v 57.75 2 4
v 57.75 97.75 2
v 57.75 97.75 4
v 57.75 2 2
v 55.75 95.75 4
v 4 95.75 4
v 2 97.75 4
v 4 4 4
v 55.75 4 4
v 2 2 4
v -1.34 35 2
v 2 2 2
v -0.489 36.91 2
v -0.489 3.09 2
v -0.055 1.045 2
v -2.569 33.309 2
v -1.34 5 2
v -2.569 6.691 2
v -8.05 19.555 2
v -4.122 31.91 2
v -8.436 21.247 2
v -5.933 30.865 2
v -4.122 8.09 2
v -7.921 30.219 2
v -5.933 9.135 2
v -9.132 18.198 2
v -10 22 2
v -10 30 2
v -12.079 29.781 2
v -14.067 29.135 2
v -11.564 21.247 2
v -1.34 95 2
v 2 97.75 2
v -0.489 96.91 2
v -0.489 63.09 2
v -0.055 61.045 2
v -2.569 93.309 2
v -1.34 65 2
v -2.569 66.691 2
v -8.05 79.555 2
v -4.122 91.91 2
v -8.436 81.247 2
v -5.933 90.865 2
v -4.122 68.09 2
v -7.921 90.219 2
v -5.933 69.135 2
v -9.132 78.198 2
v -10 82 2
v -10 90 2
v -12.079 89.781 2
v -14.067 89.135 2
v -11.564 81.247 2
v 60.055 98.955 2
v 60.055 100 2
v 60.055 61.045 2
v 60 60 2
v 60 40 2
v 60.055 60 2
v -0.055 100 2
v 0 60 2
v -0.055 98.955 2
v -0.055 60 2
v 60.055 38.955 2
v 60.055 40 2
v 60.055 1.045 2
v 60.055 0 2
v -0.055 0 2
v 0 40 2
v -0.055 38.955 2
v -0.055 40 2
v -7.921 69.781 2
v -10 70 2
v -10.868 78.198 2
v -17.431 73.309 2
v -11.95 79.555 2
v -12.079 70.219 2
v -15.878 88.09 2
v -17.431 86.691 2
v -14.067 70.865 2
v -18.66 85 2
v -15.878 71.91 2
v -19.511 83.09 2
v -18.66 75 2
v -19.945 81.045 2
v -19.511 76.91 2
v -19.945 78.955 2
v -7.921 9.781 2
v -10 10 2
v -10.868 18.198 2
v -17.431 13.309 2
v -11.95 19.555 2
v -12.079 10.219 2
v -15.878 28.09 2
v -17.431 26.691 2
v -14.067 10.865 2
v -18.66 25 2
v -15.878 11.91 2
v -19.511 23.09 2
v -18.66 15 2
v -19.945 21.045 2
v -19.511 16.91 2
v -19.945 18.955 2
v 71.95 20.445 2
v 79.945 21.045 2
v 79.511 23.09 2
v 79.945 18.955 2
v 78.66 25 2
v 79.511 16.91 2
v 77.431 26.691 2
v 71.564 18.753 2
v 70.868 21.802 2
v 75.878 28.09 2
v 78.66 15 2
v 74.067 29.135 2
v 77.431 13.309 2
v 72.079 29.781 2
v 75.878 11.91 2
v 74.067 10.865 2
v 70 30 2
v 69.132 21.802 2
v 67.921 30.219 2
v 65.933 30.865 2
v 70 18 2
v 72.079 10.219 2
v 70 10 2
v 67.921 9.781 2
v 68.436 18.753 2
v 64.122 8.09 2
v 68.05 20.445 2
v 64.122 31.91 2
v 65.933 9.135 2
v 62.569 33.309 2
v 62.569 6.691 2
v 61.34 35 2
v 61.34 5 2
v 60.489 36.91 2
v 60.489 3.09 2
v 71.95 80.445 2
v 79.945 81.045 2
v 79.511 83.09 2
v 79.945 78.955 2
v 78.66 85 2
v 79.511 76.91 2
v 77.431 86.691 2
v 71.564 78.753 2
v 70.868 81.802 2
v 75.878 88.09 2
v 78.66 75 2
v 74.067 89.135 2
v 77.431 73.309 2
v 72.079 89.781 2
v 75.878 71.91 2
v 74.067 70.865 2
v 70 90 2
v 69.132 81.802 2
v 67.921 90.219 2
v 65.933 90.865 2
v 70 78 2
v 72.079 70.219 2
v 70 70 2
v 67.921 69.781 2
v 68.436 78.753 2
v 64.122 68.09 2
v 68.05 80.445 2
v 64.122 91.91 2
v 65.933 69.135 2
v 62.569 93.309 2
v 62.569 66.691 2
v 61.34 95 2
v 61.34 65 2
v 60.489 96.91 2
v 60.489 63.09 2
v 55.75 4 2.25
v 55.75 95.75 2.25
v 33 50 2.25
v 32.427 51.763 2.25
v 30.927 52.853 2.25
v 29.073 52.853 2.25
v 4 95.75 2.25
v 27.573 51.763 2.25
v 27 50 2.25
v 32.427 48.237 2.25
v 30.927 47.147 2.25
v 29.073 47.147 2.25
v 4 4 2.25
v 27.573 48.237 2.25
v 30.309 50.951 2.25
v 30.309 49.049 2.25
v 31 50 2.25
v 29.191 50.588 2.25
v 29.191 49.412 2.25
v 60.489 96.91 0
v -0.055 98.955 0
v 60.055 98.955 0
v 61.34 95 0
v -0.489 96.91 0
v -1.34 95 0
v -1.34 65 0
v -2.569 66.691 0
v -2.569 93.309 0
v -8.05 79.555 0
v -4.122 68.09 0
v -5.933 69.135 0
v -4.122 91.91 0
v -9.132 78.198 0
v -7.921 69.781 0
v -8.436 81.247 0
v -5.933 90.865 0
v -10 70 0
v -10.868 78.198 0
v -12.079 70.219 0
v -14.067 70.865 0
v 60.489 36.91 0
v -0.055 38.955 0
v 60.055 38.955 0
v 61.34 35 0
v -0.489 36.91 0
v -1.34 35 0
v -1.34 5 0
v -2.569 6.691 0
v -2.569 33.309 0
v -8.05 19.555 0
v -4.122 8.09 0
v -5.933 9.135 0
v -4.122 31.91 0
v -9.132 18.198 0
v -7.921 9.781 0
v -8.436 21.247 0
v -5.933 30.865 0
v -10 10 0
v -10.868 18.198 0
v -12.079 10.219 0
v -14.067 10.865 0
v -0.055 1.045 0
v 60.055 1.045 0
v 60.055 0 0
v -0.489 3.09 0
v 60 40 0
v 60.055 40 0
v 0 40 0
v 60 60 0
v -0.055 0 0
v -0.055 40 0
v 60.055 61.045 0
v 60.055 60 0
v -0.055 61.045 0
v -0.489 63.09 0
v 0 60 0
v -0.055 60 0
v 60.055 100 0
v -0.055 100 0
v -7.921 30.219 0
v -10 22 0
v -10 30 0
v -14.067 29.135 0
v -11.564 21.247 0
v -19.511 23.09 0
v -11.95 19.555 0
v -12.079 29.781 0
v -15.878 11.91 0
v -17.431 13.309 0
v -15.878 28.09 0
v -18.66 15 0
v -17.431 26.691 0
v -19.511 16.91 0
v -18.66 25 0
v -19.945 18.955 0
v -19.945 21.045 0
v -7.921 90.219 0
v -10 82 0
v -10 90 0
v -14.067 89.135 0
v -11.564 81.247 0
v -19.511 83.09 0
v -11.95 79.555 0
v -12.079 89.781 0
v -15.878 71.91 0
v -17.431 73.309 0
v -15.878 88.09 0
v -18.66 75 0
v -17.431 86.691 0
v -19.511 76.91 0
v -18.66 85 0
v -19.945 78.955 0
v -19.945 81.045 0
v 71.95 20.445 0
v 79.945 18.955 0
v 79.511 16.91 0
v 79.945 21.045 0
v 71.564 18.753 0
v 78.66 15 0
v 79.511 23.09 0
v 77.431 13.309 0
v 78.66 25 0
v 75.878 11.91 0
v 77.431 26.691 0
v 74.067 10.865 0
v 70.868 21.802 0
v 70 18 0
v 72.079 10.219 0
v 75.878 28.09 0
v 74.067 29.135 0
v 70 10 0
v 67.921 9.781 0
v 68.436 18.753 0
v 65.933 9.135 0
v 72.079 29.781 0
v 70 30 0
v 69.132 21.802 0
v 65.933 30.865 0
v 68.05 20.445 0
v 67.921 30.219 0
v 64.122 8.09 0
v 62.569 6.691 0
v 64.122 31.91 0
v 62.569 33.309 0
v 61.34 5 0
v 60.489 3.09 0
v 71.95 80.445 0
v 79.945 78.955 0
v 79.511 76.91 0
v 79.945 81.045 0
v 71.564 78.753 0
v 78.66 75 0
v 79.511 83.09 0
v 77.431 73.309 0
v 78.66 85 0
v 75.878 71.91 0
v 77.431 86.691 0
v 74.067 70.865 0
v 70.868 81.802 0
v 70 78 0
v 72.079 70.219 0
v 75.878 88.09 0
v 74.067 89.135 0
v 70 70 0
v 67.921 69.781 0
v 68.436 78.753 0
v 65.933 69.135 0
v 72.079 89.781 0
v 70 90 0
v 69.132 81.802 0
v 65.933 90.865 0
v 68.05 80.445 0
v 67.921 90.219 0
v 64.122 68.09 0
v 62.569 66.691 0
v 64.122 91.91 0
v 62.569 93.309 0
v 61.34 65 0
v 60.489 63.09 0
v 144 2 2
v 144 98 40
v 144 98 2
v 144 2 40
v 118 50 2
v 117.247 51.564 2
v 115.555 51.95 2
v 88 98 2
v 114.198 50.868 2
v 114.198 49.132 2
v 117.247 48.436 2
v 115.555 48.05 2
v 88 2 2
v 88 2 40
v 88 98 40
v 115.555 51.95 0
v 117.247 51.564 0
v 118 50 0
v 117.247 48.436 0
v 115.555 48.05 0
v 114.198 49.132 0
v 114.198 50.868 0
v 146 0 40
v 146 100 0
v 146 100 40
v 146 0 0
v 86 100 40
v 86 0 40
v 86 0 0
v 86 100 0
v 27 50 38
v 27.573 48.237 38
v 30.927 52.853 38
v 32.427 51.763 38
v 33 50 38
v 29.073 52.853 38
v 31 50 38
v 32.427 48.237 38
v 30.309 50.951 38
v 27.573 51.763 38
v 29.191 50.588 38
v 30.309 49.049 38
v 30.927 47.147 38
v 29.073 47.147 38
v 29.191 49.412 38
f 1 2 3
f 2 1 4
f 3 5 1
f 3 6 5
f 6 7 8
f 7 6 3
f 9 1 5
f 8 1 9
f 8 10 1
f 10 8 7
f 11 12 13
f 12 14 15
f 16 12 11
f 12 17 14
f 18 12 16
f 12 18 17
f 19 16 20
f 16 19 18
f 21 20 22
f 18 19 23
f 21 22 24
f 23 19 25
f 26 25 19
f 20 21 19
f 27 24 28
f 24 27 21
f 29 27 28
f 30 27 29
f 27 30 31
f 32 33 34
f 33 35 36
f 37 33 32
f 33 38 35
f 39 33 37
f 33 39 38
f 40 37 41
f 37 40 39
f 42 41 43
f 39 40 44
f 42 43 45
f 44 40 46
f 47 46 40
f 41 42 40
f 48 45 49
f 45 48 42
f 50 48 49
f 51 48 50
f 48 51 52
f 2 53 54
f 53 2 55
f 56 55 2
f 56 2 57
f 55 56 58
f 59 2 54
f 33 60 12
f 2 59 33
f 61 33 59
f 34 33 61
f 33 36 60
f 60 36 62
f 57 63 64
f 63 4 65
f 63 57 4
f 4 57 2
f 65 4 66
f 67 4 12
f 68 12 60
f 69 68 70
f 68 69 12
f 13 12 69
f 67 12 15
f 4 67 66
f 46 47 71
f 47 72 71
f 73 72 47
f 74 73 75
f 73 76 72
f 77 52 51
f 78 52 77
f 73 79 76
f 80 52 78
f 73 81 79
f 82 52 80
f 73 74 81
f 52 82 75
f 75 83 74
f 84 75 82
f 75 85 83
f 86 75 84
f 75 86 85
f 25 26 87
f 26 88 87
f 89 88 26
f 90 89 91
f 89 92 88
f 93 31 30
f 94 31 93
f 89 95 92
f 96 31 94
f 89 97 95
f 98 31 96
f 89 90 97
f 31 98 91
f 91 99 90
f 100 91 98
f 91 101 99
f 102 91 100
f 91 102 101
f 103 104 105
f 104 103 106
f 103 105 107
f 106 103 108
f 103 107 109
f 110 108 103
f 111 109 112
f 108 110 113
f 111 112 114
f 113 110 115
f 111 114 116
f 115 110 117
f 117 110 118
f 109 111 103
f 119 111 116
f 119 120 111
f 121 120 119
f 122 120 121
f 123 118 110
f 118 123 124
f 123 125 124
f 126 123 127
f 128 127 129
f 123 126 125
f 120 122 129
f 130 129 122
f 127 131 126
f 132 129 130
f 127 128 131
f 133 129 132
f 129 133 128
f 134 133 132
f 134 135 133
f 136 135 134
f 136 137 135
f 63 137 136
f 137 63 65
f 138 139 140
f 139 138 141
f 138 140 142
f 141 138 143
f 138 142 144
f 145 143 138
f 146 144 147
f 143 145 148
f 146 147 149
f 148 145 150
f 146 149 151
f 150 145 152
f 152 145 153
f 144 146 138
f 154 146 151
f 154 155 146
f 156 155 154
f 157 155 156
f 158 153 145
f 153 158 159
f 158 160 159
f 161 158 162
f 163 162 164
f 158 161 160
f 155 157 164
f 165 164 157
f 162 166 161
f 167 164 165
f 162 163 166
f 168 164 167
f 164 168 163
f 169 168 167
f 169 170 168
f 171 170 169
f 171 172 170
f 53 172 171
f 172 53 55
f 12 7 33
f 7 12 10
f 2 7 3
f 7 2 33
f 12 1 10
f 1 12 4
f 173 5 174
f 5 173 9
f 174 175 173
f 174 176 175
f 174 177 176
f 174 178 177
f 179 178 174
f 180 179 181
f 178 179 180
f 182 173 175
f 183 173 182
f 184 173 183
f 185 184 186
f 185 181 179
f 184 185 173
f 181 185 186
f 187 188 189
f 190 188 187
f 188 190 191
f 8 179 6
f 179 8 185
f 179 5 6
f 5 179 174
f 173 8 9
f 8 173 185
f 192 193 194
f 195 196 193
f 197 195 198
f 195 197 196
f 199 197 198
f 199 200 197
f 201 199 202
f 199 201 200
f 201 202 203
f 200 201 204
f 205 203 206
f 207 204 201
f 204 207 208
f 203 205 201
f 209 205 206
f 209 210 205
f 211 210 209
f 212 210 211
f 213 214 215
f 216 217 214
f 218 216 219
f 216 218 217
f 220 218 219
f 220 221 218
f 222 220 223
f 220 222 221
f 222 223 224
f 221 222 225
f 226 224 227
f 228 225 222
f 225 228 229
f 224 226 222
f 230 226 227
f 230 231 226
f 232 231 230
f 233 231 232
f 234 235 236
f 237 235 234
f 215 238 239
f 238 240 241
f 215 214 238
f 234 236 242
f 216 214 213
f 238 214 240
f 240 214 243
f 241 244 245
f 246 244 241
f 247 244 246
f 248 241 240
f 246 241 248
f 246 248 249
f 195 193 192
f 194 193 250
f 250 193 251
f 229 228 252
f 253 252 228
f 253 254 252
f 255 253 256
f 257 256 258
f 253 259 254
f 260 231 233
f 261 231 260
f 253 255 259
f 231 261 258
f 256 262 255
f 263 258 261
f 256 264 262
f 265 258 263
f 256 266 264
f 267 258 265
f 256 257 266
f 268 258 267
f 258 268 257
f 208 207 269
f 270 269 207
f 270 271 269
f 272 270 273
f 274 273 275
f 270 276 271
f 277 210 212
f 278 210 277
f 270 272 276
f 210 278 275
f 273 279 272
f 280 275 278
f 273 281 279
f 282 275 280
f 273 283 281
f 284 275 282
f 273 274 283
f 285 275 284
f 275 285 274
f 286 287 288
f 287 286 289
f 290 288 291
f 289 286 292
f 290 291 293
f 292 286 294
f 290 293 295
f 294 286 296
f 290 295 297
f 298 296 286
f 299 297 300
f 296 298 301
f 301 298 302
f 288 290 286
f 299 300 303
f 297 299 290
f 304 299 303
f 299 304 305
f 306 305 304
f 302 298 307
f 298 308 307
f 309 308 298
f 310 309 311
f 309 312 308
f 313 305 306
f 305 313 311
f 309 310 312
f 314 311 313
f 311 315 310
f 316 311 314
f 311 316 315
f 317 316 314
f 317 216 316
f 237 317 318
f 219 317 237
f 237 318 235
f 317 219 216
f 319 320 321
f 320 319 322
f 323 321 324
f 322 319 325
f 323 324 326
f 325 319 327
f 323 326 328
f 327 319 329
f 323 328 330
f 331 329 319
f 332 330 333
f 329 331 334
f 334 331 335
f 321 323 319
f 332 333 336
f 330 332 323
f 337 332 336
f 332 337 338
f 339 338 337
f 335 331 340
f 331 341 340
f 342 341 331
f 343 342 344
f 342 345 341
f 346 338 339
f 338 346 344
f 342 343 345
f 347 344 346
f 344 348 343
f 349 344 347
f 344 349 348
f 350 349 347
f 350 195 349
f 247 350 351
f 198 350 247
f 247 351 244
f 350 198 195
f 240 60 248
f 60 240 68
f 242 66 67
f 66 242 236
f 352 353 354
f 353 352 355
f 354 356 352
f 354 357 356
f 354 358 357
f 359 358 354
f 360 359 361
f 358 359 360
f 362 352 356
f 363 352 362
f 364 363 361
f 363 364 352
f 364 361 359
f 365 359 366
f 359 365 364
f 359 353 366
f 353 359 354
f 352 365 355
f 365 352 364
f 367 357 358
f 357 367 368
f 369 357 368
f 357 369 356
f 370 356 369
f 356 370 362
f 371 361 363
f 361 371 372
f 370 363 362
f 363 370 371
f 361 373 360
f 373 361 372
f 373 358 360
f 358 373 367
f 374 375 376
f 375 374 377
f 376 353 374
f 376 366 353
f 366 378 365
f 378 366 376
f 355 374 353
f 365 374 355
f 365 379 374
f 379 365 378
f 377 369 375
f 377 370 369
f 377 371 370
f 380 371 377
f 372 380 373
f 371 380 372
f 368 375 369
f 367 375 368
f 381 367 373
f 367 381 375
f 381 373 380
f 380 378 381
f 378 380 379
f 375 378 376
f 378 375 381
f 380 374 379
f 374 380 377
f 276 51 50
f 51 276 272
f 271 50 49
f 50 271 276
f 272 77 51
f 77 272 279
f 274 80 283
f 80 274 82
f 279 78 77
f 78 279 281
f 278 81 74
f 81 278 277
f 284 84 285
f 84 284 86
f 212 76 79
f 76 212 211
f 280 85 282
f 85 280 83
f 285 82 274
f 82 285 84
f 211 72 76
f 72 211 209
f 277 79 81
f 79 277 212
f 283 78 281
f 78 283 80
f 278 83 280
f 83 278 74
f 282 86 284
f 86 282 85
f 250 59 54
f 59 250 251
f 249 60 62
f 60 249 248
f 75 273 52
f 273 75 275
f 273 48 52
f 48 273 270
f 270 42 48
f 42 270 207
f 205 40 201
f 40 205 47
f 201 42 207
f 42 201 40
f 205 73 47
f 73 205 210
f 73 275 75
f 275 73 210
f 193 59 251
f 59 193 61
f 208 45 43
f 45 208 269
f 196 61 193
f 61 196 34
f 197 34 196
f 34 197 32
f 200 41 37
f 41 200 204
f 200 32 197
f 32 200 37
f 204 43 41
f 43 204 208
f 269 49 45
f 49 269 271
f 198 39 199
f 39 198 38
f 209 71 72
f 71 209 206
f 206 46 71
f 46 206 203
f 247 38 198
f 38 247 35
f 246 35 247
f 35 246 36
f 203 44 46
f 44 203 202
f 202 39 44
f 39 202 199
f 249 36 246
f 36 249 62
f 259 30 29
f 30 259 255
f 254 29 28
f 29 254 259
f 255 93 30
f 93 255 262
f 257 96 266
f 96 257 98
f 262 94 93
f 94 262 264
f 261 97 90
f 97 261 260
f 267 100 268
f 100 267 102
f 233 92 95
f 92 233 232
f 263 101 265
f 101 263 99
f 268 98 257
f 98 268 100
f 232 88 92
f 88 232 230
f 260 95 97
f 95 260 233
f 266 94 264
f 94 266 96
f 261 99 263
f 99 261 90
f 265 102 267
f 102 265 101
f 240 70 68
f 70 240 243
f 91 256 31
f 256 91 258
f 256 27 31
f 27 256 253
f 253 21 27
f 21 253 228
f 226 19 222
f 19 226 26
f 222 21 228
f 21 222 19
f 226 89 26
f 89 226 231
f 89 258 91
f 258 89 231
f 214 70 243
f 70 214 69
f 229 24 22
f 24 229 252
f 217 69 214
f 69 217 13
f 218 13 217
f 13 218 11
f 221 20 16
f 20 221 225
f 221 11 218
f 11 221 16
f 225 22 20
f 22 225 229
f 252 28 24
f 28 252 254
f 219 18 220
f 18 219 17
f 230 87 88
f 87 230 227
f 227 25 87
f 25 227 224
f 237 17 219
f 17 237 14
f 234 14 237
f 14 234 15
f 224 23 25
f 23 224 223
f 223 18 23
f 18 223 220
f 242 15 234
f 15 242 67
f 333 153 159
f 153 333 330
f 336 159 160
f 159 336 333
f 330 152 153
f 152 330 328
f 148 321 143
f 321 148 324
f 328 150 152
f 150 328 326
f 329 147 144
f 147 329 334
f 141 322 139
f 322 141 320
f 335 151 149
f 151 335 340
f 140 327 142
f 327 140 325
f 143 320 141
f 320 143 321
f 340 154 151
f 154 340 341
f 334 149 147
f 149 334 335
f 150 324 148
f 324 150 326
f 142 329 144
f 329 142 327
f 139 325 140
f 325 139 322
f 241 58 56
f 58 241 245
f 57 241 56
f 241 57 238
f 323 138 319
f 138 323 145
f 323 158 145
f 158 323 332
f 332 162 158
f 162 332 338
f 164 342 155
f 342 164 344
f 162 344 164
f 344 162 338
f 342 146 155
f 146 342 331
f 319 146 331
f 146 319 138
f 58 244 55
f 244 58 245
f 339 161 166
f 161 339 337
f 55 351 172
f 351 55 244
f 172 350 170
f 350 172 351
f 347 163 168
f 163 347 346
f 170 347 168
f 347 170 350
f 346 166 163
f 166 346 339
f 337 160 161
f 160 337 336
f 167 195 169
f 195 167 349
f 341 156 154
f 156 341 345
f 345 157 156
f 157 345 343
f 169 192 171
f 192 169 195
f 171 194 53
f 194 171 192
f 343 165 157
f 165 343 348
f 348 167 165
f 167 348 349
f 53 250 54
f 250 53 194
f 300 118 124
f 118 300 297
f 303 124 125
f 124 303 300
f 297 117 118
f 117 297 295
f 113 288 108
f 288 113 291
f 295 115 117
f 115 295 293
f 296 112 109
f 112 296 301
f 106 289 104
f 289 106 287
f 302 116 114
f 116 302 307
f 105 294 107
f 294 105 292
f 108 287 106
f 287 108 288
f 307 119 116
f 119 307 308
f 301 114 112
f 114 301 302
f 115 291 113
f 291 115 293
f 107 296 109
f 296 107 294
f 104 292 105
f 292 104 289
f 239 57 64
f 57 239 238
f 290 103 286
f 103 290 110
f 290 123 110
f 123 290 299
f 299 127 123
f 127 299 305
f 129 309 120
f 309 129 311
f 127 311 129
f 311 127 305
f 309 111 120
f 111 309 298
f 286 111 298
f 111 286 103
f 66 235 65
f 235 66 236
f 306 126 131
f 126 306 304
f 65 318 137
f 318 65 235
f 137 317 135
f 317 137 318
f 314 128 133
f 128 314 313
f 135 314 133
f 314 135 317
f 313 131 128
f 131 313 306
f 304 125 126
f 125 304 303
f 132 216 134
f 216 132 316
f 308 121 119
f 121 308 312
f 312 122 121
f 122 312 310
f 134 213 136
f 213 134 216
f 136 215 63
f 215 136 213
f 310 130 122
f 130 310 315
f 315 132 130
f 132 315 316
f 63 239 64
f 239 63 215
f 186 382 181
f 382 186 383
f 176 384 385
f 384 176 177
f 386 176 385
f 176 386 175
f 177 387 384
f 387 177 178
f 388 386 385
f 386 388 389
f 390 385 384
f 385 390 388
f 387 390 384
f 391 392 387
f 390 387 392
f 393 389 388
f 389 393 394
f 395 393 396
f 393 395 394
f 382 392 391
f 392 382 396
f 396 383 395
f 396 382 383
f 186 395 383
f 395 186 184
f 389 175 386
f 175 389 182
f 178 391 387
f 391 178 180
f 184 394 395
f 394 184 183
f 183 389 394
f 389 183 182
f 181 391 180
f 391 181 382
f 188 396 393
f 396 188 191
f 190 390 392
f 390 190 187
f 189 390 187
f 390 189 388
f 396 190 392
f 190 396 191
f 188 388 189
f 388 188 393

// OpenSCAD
FUDGE = 0.25;  // extra space for parts to fit
WALL_THK = 2; // how thick the walls are
BOX_OUTER = [60,100,40];  // how big the box is
FLANGE_R = 10;
FLANGE_SCREW_R = 2;

function box_inner() = [BOX_OUTER[0]-WALL_THK*2, BOX_OUTER[1]-WALL_THK*2, BOX_OUTER[2] ]; 

module box_lid() {
// box lid goes over project stuff
  difference() {
    cube(BOX_OUTER);
    union () {
      translate([WALL_THK,WALL_THK, WALL_THK]) cube(   box_inner());
      translate([BOX_OUTER[0]/2, BOX_OUTER[1]/2, -  WALL_THK/2]) cylinder( WALL_THK*2, FLANGE_SCREW_R, FLANGE_SCREW_R);
    }
  } 
}



module box_bottom (BOX_OUTER) {
  // project goes on flat board bottom of box thingy
  box_bottom = [BOX_OUTER[0],BOX_OUTER[1], WALL_THK];
  box_inner = box_inner();
  //union () {
    cube(box_bottom); 
    // make lip
    difference() {
      translate([ WALL_THK, WALL_THK, WALL_THK]) cube([box_inner[0]-FUDGE, box_inner[1]-FUDGE, WALL_THK ]);
      translate([ WALL_THK*2, WALL_THK*2, WALL_THK+  FUDGE]) cube([ box_inner[0]-(2*WALL_THK+FUDGE),box_inner[1]-(2*WALL_THK+FUDGE), WALL_THK ]);
    }
  //}
  
}

box_bottom = [BOX_OUTER[0],BOX_OUTER[1], WALL_THK];
cube(box_bottom);

module screw_flange ( ) {
   translate([0,FLANGE_R,0]) difference() {
       union () {
           cylinder( WALL_THK, FLANGE_R, FLANGE_R );
           translate([-FLANGE_R*2,-FLANGE_R,0]) cube([FLANGE_R*4, FLANGE_R, WALL_THK]);
       }
       translate([0,0,-0.5]) cylinder( WALL_THK+1, FLANGE_SCREW_R, FLANGE_SCREW_R);
       translate([ FLANGE_R*2, 0, -0.5]) cylinder( WALL_THK+1, FLANGE_R,FLANGE_R);
       translate([ -FLANGE_R*2, 0, -0.5]) cylinder( WALL_THK+1, FLANGE_R,FLANGE_R);
   }
   
}

module standoff (height, rad, screw_rad) {
    difference () {
      cylinder(height, rad, rad);
      translate([0,0,WALL_THK]) cylinder(height, screw_rad, screw_rad);
    }   
}

to_the_right = BOX_OUTER[0]+FLANGE_R*2+3*WALL_THK;

// Box Bottom & Top
box_bottom();
translate([to_the_right, 0, 0]) box_lid();

// Flanges
translate([0, BOX_OUTER[1]-FLANGE_R*2, 0]) rotate([0,0,90]) screw_flange( );
translate([0, FLANGE_R*2, 0]) rotate([0,0,90]) screw_flange( );

translate([BOX_OUTER[0], BOX_OUTER[1]-FLANGE_R*2, 0]) rotate([0,0,270]) screw_flange( );
translate([BOX_OUTER[0], FLANGE_R*2, 0]) rotate([0,0,270]) screw_flange( );

// Standoff Post
translate([BOX_OUTER[0]/2, BOX_OUTER[1]/2, 0]) standoff (BOX_OUTER[2]-WALL_THK,3,1);
